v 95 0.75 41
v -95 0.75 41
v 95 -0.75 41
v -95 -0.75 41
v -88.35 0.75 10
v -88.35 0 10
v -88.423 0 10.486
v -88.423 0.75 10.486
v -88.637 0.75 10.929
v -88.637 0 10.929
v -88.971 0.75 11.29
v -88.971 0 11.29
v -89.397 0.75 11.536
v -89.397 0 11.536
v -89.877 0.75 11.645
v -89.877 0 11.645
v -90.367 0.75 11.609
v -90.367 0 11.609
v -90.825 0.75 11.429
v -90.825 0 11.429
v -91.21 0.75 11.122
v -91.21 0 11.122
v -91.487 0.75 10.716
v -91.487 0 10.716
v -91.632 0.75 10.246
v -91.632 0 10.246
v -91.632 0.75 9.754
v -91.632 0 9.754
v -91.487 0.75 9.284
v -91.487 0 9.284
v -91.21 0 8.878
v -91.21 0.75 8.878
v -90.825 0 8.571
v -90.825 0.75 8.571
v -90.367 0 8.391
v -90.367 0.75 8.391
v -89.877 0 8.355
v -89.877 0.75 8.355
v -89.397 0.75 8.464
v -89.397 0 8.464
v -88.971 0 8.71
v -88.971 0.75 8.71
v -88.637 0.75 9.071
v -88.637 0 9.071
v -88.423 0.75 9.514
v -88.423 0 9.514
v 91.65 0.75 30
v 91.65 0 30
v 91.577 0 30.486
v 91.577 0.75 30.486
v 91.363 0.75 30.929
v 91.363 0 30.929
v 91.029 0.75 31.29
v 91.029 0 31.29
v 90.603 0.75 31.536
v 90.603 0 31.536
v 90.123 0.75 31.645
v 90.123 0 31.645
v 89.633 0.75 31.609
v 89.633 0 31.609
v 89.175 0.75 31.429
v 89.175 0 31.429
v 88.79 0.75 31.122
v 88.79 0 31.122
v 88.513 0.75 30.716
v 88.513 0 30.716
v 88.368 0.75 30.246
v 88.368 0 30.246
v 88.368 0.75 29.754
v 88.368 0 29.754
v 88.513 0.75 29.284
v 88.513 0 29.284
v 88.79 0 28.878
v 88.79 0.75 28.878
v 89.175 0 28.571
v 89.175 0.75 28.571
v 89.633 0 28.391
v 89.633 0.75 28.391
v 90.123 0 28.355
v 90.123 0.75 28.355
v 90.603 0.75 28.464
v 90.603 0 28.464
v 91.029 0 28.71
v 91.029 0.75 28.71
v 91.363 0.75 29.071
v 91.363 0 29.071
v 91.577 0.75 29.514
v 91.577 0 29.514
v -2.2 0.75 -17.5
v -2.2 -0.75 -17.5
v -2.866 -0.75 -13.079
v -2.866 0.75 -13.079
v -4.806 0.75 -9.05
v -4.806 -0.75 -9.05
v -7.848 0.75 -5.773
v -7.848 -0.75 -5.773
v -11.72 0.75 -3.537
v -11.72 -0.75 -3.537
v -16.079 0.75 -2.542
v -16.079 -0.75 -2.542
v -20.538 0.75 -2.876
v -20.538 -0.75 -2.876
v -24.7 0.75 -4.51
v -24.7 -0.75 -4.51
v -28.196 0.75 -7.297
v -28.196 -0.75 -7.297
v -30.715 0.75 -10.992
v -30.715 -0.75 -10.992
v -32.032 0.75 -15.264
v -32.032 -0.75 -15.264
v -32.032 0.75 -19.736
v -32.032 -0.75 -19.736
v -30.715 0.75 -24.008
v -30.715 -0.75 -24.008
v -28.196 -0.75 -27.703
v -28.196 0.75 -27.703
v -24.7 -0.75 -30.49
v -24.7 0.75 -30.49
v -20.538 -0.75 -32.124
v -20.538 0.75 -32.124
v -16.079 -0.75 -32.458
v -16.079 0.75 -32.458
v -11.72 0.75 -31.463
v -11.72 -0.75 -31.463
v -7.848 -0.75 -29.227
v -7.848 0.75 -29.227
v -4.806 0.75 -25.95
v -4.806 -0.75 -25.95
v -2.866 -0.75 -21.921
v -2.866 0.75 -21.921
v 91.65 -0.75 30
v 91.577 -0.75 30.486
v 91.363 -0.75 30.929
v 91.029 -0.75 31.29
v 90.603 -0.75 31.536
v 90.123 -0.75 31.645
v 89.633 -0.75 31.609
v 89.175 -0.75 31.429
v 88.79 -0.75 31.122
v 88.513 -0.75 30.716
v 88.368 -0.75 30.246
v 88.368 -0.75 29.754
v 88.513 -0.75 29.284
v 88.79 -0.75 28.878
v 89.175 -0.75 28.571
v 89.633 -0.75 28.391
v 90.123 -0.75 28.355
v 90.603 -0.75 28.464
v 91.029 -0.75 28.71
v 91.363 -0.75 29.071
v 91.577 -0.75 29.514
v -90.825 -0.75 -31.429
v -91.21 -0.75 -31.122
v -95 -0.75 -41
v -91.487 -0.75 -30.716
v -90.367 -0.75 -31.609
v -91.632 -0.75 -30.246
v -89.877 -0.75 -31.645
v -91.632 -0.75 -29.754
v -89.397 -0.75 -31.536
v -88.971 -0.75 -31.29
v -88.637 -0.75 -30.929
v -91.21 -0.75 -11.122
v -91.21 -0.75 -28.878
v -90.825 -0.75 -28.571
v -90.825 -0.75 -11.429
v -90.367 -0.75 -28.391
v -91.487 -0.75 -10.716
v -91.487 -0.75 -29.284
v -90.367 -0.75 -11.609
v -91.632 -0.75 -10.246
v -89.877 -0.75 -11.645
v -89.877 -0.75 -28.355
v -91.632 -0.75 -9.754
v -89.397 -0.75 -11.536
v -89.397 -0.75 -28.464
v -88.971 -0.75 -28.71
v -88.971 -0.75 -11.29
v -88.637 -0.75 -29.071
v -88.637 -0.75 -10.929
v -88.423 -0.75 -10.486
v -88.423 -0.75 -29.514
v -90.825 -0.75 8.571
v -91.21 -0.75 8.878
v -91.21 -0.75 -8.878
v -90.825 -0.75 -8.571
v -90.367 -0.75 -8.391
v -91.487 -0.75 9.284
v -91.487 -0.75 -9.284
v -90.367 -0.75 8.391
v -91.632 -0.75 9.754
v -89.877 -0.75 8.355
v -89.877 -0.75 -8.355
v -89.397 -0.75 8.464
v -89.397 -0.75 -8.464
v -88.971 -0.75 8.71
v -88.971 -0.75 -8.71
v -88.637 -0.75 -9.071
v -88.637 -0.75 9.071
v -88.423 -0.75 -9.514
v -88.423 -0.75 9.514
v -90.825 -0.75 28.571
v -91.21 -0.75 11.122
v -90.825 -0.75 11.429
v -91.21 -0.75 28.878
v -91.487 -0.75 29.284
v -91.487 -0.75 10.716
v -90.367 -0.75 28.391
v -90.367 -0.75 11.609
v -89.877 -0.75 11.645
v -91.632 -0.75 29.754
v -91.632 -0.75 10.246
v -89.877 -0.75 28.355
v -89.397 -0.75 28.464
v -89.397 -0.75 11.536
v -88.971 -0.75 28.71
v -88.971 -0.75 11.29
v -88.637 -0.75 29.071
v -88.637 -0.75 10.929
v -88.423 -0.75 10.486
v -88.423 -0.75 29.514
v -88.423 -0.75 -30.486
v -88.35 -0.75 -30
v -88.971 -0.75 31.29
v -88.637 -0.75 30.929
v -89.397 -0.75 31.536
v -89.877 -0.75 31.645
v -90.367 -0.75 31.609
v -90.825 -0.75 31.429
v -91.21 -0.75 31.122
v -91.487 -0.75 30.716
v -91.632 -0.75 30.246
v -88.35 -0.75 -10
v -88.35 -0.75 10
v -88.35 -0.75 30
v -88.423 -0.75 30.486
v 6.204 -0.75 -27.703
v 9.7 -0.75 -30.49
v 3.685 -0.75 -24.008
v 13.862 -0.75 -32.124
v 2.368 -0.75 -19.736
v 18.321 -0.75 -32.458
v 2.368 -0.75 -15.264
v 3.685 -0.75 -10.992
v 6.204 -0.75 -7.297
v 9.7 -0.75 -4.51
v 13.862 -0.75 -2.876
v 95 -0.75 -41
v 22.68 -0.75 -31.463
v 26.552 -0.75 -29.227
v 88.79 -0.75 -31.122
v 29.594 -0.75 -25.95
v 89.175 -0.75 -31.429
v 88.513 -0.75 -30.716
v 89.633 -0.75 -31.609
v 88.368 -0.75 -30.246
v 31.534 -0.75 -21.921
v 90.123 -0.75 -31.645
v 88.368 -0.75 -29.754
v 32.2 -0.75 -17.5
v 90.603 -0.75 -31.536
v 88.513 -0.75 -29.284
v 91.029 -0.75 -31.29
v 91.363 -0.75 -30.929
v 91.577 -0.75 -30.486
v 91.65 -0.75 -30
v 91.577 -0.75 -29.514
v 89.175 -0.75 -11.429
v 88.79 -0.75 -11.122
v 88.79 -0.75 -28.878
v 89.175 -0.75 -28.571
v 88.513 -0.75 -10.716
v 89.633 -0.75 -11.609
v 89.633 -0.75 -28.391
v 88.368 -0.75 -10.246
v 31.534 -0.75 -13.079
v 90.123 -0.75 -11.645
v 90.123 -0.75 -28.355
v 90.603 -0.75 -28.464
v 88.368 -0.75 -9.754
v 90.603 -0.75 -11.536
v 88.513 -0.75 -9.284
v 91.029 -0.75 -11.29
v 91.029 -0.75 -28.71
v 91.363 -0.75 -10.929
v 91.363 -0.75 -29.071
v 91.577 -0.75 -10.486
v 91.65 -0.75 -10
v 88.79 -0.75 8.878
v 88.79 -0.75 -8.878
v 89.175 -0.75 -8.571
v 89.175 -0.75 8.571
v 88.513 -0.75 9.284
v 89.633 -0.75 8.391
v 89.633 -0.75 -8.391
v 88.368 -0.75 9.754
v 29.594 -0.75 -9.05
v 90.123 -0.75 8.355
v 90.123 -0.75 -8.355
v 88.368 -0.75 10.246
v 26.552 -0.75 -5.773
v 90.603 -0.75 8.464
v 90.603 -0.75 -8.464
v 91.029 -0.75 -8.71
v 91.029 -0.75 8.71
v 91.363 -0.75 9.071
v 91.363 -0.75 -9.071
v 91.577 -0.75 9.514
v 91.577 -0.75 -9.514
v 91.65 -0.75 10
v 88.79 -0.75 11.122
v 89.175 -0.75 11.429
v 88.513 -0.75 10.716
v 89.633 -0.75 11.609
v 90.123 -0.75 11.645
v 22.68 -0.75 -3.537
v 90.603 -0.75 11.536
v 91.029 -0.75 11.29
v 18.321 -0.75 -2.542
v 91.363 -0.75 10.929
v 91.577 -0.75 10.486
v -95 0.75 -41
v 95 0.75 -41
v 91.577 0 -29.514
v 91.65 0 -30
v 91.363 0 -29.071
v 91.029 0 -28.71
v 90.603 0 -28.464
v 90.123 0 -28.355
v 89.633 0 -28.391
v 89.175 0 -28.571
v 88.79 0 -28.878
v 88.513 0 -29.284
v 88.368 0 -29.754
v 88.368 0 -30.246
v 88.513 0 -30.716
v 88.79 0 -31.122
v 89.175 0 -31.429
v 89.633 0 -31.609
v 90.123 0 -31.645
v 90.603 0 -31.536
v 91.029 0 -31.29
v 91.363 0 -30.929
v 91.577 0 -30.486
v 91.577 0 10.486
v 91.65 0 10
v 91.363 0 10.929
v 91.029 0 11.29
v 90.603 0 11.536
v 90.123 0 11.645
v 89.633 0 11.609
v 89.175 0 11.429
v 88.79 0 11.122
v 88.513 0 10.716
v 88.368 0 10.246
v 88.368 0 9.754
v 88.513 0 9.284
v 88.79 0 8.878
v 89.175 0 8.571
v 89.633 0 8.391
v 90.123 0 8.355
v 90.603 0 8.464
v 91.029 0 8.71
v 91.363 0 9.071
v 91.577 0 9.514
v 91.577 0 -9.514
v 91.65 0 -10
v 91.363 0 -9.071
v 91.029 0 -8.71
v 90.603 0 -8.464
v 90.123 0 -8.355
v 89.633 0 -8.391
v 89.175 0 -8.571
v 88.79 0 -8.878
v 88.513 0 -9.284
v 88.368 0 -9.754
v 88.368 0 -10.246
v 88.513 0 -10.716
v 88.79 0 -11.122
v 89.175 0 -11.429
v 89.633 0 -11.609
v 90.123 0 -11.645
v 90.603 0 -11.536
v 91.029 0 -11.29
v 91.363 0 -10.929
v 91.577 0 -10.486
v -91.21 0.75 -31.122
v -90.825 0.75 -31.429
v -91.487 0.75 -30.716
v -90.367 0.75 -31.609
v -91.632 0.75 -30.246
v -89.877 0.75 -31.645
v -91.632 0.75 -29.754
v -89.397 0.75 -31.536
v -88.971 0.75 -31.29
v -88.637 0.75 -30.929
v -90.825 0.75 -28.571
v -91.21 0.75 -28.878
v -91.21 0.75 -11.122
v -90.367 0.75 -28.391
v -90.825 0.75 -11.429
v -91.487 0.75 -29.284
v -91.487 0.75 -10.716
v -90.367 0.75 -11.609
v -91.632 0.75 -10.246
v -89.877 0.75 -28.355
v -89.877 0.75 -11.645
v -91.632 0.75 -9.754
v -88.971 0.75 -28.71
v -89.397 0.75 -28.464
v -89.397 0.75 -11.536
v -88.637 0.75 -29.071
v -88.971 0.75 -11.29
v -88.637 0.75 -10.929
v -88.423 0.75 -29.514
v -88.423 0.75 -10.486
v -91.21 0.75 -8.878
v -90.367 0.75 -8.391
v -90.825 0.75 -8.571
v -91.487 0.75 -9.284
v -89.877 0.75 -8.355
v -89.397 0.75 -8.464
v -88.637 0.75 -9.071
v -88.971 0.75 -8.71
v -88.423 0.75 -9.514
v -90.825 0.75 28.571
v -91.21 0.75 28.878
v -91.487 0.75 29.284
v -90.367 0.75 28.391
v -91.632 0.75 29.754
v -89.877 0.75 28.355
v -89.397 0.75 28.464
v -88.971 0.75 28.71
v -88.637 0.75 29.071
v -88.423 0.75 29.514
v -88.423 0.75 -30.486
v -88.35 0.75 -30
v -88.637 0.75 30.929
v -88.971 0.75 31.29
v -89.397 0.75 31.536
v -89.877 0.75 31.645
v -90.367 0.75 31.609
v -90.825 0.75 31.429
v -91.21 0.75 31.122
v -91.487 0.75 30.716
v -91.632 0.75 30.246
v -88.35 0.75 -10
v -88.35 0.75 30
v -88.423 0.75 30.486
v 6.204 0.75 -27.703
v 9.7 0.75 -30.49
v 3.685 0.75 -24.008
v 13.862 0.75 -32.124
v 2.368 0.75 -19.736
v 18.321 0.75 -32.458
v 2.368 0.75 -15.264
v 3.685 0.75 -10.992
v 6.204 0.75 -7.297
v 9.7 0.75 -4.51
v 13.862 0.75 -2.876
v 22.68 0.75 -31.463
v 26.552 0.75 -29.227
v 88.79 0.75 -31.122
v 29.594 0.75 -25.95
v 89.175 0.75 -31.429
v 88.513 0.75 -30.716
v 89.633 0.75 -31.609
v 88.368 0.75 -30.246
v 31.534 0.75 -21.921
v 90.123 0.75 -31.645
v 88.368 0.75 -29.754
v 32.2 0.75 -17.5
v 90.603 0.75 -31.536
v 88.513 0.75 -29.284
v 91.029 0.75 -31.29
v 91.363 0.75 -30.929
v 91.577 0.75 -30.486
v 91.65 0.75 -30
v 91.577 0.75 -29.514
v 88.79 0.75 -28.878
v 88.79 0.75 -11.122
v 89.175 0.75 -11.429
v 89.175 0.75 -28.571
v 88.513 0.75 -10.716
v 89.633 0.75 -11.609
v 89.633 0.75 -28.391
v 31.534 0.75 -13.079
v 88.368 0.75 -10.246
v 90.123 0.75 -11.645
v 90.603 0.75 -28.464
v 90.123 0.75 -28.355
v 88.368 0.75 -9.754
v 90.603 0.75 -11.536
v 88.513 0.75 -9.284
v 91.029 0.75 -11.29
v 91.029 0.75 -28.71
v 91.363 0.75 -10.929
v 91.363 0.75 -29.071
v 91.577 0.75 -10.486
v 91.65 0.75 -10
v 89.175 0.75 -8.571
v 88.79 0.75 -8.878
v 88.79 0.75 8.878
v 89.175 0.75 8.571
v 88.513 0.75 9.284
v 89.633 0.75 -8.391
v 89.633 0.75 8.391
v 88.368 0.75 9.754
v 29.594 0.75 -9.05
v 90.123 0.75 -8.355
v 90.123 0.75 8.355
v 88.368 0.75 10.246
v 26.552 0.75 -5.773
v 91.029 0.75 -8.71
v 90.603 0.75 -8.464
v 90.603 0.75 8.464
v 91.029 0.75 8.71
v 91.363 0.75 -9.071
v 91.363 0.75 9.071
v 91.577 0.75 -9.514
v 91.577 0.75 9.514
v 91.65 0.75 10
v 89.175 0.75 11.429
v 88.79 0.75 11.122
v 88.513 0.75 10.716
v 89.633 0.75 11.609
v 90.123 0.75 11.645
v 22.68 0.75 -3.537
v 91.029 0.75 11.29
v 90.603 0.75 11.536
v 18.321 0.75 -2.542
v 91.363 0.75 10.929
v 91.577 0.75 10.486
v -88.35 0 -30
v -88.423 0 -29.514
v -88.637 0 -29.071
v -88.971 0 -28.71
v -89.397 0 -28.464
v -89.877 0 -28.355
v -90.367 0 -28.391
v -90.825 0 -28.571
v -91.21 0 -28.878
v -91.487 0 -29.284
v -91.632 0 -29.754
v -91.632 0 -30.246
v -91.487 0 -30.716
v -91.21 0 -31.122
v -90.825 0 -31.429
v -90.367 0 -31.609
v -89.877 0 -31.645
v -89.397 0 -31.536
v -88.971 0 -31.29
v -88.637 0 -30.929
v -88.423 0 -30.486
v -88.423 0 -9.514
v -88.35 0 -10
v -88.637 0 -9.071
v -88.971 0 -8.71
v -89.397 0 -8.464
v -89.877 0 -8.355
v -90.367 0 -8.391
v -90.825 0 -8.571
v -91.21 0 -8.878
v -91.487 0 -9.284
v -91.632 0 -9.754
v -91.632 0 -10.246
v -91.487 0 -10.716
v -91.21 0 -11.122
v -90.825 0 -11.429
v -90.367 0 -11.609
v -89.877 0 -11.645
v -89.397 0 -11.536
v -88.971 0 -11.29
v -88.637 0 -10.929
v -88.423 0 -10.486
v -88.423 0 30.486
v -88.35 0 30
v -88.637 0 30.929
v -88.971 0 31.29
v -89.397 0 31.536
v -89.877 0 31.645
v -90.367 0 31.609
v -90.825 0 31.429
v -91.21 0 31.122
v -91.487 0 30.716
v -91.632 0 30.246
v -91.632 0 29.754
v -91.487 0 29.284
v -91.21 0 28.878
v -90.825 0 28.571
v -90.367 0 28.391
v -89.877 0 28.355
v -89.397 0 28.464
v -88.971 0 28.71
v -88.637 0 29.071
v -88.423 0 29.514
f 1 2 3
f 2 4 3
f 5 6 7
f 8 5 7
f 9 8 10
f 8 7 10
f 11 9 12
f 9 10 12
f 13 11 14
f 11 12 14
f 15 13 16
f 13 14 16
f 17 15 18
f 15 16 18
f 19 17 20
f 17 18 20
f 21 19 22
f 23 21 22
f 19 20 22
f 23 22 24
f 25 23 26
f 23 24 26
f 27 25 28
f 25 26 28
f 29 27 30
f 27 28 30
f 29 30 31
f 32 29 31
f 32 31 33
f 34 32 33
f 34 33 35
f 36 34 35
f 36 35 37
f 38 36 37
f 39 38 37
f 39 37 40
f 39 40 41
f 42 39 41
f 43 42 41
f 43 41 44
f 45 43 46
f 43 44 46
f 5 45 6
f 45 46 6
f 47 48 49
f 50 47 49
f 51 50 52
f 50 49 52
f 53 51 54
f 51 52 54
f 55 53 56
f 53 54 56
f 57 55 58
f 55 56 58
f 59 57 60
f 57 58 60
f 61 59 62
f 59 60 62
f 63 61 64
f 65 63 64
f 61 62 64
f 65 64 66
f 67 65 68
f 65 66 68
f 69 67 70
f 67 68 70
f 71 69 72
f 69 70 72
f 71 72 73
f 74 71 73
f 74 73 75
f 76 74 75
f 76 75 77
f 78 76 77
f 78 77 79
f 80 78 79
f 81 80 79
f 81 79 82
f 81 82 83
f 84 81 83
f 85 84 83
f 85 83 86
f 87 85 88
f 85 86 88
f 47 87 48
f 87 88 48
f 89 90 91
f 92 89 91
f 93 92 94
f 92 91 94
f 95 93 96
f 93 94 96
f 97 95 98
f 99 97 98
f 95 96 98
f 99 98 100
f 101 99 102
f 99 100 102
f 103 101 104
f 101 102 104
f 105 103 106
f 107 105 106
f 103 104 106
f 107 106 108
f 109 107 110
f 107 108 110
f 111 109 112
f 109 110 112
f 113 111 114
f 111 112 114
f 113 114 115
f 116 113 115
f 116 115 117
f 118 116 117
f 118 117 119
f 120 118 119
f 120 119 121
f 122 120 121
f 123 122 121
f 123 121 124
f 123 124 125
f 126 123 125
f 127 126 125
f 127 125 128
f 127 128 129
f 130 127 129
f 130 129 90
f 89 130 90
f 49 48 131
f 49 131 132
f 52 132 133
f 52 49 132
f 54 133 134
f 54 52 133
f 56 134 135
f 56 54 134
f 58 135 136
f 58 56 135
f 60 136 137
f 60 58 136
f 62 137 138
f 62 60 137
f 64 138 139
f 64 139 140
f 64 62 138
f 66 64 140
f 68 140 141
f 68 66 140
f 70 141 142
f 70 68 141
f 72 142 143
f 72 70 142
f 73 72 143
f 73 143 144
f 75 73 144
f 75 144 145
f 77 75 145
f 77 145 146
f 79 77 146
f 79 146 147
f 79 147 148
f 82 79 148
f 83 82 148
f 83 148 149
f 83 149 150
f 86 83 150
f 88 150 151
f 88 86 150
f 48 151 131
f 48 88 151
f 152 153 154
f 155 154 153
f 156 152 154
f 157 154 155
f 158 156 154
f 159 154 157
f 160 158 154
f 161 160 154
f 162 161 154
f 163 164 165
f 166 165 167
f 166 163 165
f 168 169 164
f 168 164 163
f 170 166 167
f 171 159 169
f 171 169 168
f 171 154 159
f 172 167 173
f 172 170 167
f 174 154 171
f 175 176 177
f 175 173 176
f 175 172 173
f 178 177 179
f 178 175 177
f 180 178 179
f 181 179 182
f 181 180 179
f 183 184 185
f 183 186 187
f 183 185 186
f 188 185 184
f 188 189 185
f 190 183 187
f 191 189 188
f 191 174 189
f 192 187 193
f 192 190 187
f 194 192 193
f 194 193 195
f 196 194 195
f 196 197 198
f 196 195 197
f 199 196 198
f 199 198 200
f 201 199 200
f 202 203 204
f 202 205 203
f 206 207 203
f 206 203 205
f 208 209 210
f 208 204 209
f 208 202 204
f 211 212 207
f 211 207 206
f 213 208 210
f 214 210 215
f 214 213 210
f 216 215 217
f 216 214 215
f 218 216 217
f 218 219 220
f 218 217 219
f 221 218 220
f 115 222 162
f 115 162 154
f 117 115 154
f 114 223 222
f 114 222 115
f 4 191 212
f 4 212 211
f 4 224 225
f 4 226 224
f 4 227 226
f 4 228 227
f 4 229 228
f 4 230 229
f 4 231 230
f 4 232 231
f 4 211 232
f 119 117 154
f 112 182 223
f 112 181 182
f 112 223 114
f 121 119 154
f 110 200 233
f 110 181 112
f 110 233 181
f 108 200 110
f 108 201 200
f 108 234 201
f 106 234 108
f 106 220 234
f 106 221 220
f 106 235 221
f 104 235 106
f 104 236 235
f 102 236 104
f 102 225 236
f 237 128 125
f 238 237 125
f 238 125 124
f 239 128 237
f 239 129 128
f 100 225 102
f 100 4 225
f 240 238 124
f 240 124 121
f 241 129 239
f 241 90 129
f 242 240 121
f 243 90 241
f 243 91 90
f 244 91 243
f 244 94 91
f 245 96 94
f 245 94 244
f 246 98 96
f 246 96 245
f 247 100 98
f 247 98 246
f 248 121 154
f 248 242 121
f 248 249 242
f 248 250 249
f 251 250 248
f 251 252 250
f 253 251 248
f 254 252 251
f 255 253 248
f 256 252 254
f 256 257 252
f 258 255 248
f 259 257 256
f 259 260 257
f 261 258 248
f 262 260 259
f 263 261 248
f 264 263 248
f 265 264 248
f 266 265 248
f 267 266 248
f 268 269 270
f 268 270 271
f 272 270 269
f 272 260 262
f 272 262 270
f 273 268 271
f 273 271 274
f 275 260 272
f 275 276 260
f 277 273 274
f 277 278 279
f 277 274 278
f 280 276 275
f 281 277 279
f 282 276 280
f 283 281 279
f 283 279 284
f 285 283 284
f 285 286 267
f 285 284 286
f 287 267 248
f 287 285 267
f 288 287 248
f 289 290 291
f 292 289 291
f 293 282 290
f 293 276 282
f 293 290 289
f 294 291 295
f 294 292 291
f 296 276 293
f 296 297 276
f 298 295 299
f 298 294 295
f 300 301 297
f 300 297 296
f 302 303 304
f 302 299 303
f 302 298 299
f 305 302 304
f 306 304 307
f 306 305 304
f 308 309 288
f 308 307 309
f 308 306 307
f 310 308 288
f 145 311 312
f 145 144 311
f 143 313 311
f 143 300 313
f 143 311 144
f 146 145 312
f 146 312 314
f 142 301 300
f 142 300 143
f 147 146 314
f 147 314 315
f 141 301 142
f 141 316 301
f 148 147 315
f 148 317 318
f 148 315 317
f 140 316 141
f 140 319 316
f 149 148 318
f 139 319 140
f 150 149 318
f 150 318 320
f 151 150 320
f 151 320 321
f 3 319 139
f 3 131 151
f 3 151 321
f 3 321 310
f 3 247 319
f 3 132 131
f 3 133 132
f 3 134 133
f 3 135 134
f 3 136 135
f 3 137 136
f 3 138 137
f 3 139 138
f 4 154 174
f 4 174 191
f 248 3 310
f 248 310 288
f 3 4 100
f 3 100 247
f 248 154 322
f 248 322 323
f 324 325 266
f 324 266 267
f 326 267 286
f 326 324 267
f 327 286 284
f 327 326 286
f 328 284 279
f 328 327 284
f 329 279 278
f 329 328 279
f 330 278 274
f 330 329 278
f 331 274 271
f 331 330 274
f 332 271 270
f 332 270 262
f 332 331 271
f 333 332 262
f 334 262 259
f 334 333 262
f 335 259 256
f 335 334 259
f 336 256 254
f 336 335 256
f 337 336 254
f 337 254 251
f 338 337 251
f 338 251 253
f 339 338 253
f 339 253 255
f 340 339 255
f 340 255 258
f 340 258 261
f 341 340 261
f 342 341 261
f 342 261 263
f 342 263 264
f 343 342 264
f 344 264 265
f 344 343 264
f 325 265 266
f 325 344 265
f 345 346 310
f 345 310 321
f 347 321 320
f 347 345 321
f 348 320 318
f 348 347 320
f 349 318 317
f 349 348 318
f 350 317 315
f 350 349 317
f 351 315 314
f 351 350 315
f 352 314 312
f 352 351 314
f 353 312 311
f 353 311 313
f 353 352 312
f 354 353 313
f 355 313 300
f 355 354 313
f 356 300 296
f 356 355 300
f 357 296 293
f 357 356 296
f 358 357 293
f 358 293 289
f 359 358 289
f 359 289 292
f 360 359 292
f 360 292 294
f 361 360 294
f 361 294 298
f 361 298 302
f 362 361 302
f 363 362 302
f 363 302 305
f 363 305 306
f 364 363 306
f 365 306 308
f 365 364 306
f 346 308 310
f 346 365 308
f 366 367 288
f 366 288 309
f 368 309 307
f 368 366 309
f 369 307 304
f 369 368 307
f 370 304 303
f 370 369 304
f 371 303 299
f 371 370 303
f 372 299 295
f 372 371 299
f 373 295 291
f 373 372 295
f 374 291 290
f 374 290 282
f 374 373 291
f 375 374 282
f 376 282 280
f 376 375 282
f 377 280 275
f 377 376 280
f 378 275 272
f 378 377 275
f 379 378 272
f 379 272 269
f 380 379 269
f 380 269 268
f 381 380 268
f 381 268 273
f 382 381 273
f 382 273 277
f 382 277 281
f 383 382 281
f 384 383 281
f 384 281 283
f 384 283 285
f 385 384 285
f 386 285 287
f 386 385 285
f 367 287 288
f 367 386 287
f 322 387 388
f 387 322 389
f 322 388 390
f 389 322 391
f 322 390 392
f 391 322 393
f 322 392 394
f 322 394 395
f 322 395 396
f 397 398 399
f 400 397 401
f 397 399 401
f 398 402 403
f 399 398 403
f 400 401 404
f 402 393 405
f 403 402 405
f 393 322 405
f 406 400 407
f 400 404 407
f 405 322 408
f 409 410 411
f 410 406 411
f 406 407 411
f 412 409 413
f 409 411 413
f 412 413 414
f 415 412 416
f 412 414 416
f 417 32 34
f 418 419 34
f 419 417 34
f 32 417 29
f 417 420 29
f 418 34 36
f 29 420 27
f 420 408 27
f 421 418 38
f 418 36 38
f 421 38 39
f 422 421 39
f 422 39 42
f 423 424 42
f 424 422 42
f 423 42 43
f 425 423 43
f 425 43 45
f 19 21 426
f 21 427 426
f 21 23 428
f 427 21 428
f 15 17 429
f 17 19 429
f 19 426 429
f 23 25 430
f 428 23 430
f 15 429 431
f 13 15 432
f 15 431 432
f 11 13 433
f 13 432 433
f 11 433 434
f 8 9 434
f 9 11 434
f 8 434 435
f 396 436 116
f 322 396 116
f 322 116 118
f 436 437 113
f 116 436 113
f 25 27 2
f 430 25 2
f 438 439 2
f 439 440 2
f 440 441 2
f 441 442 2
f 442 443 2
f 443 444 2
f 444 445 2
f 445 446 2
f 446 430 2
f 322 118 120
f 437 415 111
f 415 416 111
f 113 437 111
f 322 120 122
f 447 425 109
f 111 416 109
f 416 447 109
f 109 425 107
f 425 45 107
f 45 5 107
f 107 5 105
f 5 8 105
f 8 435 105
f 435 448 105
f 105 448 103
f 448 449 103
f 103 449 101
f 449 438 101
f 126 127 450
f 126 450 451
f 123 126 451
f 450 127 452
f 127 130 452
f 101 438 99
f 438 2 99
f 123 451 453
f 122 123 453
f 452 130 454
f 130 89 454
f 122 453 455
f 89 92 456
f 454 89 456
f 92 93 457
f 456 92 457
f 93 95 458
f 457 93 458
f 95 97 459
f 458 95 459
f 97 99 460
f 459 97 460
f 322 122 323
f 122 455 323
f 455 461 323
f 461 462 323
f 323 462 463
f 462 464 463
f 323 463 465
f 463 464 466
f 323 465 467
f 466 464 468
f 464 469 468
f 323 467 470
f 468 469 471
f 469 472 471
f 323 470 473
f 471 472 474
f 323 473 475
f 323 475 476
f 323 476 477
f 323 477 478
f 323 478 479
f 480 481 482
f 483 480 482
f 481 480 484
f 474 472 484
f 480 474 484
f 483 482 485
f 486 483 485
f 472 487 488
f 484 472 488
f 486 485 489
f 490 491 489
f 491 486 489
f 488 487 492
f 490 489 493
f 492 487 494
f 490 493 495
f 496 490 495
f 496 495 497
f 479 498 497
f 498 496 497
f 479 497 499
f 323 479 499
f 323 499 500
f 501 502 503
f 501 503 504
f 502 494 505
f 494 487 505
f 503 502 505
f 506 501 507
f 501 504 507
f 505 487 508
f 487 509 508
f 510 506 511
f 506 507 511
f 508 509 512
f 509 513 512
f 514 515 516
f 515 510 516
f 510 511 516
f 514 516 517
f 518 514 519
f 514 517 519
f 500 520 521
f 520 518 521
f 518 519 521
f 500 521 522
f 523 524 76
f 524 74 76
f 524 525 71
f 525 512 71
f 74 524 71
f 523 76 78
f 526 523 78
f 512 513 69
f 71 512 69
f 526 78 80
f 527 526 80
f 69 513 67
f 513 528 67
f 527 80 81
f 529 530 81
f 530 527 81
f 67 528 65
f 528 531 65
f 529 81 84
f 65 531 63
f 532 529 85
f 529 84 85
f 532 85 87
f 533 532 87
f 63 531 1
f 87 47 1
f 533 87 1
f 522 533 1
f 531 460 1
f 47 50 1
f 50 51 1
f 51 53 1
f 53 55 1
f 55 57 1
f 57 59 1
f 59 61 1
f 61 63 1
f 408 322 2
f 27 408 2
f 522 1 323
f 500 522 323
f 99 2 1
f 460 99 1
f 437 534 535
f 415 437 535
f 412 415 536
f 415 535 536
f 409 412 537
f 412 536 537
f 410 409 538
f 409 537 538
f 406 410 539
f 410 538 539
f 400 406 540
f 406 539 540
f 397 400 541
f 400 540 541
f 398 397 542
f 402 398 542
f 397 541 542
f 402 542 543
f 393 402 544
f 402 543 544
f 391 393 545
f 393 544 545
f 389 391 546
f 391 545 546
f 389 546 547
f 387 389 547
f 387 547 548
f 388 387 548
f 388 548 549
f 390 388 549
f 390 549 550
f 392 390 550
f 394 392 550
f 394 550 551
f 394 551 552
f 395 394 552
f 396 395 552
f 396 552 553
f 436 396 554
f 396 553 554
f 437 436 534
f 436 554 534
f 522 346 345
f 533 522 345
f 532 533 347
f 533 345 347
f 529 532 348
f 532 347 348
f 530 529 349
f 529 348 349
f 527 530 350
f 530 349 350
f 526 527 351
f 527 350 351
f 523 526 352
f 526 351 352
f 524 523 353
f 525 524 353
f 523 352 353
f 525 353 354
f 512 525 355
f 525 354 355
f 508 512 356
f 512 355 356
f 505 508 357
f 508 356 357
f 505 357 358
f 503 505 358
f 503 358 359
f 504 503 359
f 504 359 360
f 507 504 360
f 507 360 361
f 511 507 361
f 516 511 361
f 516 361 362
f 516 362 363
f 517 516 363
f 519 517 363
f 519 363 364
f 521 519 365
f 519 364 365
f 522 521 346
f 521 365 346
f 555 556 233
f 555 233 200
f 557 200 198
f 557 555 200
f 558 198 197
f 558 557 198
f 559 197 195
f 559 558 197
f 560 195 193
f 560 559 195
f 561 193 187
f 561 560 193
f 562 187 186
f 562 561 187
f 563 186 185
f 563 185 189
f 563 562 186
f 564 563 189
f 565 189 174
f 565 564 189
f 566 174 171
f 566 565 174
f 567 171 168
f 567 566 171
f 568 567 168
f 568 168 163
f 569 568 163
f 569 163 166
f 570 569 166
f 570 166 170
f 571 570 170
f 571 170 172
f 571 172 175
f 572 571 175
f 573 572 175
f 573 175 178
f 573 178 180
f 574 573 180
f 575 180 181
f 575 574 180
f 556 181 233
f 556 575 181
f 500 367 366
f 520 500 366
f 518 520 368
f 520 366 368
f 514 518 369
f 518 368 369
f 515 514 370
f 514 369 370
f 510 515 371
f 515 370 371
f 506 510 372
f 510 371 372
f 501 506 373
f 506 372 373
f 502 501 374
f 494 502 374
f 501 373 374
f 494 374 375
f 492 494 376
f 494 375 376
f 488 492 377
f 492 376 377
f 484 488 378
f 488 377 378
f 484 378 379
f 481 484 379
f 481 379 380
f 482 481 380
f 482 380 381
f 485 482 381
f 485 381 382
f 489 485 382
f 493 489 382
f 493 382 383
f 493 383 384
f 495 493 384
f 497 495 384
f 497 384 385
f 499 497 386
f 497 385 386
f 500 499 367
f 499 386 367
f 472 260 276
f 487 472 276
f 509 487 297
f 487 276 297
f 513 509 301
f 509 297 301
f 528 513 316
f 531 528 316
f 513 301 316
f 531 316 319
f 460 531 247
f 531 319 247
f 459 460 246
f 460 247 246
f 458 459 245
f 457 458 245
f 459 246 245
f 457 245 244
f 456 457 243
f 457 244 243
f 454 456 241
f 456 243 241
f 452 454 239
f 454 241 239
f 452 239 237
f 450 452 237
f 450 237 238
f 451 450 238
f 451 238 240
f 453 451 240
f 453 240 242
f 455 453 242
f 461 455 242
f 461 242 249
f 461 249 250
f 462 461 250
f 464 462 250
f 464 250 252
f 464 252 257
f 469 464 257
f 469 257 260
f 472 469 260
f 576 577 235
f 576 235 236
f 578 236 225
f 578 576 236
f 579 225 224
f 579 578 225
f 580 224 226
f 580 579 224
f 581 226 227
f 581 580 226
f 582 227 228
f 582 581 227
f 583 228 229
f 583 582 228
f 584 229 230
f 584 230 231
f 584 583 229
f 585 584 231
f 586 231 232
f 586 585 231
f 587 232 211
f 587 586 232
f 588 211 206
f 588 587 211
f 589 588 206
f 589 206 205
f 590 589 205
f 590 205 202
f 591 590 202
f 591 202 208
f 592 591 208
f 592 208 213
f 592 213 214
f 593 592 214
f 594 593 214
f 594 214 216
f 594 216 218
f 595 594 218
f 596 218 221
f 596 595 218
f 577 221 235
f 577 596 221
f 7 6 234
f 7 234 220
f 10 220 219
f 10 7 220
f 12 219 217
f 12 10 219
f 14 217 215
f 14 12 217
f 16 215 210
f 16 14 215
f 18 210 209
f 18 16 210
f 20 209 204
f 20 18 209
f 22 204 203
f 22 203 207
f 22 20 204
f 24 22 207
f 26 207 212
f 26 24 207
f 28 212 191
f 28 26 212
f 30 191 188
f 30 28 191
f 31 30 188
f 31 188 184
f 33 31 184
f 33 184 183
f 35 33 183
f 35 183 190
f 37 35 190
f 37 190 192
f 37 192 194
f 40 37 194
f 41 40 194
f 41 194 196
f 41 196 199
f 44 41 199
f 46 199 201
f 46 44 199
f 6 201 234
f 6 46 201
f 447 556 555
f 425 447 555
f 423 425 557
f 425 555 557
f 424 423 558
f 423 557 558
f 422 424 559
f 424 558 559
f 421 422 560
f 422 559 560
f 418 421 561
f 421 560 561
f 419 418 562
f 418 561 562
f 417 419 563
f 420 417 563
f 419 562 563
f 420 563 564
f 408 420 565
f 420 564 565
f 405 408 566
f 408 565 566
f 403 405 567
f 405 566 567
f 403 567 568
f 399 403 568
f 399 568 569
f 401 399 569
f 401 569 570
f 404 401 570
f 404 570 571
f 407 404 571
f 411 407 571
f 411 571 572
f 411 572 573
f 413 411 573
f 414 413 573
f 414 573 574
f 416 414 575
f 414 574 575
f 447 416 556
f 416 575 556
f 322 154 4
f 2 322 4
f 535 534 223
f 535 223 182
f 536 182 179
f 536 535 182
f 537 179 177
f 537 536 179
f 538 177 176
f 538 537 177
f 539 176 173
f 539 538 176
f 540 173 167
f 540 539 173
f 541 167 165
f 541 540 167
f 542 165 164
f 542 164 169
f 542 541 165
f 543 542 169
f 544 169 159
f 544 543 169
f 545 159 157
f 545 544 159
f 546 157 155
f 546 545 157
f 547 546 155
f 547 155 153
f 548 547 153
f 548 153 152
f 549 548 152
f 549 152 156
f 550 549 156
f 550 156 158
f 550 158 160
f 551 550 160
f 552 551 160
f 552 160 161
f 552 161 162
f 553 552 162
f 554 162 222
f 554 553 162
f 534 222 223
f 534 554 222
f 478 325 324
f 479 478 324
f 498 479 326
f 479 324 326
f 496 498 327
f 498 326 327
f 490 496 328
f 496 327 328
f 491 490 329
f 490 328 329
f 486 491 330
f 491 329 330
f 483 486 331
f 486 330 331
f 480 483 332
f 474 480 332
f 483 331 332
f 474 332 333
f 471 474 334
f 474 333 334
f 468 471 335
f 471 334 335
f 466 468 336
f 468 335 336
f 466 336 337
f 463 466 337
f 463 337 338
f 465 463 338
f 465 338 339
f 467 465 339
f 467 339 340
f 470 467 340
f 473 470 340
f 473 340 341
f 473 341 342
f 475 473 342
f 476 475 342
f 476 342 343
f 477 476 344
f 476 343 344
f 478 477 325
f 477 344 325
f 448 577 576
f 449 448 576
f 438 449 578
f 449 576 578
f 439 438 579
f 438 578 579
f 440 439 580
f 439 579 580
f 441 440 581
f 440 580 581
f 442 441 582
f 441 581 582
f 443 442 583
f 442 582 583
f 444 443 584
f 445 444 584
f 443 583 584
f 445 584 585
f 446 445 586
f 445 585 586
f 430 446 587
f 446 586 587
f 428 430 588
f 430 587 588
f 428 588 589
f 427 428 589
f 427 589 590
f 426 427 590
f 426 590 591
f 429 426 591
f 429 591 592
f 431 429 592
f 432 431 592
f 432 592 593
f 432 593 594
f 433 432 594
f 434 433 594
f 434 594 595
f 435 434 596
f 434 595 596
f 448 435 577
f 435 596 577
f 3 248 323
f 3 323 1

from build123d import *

# Parameters (mm, degrees)
SKETCH_W       = 190
SKETCH_H       = 82
SKETCH_R       = 1.65
PAD_DEPTH      = 0.75
PAD_DEPTH_BACK = 0.75
SKETCH001_R    = 15
POCKET_DEPTH   = 1.501


with BuildPart() as part:
    # Sketch → Pad (new body, two sides)
    with BuildSketch(Plane.XZ) as pad_sk:
        Rectangle(SKETCH_W, SKETCH_H)
        with Locations((90, 30)):
            Circle(SKETCH_R, mode=Mode.SUBTRACT)
        with Locations((90, 10)):
            Circle(SKETCH_R, mode=Mode.SUBTRACT)
        with Locations((90, -30)):
            Circle(SKETCH_R, mode=Mode.SUBTRACT)
        with Locations((90, -10)):
            Circle(SKETCH_R, mode=Mode.SUBTRACT)
        with Locations((-90, 30)):
            Circle(SKETCH_R, mode=Mode.SUBTRACT)
        with Locations((-90, 10)):
            Circle(SKETCH_R, mode=Mode.SUBTRACT)
        with Locations((-90, -30)):
            Circle(SKETCH_R, mode=Mode.SUBTRACT)
        with Locations((-90, -10)):
            Circle(SKETCH_R, mode=Mode.SUBTRACT)
    extrude(amount=PAD_DEPTH)
    extrude(pad_sk.sketch, amount=-PAD_DEPTH_BACK)

    # Sketch001 (on Face14 of Pad) → Pocket (cut, through all)
    with BuildSketch(Plane.XZ.offset(0.75)):
        with Locations((-17.2, -17.5)):
            Circle(SKETCH001_R)
        with Locations((17.2, -17.5)):
            Circle(SKETCH001_R)
    extrude(amount=-POCKET_DEPTH, mode=Mode.SUBTRACT)


solid = part.part
